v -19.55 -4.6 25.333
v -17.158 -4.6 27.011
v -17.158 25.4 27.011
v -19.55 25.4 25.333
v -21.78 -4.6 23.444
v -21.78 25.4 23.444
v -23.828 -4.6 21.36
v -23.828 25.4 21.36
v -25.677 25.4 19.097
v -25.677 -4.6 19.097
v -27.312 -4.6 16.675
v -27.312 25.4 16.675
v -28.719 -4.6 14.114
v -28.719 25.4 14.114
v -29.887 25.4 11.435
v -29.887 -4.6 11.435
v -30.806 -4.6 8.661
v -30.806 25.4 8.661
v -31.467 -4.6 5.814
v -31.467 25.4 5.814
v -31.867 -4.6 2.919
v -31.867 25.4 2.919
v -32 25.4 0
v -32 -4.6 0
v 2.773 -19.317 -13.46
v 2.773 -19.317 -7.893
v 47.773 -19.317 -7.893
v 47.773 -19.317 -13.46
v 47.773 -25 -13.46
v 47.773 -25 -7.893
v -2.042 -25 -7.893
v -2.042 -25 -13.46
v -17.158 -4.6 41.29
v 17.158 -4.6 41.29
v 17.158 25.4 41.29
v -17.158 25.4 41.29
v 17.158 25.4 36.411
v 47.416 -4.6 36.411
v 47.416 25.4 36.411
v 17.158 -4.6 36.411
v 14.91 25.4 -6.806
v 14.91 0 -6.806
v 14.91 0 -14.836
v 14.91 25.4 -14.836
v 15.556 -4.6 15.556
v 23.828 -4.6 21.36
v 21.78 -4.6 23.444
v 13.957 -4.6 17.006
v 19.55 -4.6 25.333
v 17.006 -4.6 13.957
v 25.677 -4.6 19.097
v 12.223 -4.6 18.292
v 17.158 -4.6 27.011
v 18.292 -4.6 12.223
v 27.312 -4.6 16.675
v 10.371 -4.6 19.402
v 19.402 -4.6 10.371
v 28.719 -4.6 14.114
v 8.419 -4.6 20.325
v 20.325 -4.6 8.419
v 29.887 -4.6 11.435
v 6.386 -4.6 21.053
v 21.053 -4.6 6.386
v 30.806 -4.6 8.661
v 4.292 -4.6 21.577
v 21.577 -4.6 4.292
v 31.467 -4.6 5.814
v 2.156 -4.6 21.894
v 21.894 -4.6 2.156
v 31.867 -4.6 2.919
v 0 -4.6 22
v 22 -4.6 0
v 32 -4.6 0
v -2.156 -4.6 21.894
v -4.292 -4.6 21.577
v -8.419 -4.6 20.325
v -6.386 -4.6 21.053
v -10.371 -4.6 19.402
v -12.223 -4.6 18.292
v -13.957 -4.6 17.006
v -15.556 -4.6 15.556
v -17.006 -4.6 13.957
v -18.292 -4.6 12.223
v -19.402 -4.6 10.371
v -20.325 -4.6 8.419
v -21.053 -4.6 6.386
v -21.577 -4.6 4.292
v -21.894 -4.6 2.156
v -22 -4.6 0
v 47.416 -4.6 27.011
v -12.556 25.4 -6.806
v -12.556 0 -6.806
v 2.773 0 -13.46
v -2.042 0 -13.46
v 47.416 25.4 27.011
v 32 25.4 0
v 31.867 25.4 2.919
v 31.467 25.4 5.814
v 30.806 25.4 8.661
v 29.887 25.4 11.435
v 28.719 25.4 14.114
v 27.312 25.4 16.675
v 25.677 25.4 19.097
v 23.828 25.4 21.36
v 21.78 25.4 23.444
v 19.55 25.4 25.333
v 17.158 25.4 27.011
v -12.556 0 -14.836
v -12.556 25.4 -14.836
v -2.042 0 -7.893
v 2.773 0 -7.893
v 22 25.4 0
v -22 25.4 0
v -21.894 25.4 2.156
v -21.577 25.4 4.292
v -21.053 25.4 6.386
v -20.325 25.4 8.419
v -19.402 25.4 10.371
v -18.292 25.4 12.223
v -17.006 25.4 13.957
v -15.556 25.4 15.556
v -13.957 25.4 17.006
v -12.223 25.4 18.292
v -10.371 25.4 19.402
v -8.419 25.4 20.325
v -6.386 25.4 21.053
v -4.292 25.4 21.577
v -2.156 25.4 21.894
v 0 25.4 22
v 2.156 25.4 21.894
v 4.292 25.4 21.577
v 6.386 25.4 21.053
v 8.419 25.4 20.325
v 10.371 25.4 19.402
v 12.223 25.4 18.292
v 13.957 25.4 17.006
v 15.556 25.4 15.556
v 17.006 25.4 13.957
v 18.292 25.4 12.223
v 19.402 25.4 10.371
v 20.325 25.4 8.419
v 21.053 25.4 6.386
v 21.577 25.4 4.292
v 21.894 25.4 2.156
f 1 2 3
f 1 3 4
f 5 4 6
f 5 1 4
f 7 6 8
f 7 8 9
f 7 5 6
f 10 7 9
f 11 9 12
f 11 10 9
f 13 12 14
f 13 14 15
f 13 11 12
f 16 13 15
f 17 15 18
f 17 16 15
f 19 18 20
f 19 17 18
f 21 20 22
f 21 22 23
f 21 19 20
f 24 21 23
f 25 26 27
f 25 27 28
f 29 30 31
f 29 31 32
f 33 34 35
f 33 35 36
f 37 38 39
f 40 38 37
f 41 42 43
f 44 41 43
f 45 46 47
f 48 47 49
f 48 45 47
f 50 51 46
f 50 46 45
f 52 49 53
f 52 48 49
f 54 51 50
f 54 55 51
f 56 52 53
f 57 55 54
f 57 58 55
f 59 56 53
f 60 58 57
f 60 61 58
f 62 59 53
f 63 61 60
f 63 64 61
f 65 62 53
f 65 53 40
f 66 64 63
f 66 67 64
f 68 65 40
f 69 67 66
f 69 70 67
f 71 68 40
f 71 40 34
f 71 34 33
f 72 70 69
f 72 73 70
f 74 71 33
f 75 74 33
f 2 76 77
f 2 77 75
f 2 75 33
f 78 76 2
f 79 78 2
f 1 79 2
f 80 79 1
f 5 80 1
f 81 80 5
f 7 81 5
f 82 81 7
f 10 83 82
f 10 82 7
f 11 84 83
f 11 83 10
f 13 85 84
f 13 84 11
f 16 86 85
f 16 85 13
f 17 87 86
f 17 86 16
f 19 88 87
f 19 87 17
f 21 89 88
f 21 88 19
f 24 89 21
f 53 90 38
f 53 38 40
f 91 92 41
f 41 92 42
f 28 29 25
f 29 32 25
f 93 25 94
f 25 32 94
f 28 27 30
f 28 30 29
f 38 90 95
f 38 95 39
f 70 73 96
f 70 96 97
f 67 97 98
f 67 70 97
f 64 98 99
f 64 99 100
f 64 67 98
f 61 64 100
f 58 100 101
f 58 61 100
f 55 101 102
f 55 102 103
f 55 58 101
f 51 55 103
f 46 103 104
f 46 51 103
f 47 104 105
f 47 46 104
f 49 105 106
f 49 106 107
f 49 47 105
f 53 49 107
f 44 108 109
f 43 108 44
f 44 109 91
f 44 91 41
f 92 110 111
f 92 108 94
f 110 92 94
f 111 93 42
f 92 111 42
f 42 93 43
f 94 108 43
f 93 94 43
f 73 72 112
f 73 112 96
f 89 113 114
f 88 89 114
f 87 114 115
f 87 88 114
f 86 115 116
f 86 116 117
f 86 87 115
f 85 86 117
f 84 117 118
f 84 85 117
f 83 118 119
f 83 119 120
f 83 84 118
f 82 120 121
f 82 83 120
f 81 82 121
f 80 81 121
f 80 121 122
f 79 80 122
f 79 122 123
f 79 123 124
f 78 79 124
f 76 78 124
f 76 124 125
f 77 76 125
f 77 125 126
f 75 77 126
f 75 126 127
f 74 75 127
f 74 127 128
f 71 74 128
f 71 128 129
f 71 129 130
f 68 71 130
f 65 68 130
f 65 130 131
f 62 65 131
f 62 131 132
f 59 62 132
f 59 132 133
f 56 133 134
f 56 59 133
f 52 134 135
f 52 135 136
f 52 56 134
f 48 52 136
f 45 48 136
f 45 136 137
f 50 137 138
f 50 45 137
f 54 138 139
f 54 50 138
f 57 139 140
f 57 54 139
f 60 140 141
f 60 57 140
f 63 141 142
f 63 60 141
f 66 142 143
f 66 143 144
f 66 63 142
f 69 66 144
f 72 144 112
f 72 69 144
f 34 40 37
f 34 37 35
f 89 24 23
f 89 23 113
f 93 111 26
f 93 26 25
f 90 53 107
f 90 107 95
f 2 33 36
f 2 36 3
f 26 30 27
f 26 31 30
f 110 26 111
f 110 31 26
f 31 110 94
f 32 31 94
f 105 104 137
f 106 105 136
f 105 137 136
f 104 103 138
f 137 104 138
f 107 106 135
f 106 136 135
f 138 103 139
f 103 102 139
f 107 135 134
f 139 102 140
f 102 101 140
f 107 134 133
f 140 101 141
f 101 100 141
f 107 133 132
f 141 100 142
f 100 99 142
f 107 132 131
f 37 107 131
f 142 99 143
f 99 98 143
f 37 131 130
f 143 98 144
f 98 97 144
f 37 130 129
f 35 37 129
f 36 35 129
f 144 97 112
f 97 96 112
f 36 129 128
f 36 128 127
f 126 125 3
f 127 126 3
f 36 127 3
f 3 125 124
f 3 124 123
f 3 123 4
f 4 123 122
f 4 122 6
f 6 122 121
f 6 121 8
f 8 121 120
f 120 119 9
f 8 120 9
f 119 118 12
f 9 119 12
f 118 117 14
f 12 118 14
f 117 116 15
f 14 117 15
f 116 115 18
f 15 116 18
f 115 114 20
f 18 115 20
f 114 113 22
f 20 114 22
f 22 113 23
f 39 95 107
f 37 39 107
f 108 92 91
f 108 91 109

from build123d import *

# Parameters (mm, degrees)
BOSS_EXTRUDE1_DEPTH   = 25.4
SKETCH3_W             = 27.465648235
SKETCH3_H             = 8.029689019
BOSS_EXTRUDE1_2_DEPTH = 25.4
BOSS_EXTRUDE3_START   = -30
BOSS_EXTRUDE3_DEPTH   = 30
SKETCH11_W            = 4.815186011
SKETCH11_H            = 5.567324058
BOSS_EXTRUDE7_DEPTH   = 25
SKETCH12_W            = 5.567324058
SKETCH12_H            = 5.682782698
BOSS_EXTRUDE10_DEPTH  = 45


with BuildPart() as part:
    # Sketch3 → Boss-Extrude1 (new body)
    with BuildSketch(Plane(origin=(0, 0, 0), x_dir=(1, 0, 0), z_dir=(0, 1, 0))):
        with BuildLine():
            Line((-32, 0), (-22, 0))
            ThreePointArc((-22, 0), (0, -22), (22, 0))
            Line((22, 0), (32, 0))
            ThreePointArc((32, 0), (28.045035802, -15.410255249), (17.157752073, -27.011322511))
            Line((17.157752073, -27.011322511), (17.157752073, -33.11424945))
            Line((17.157752073, -33.11424945), (4.438736665, -33.11424945))
            Line((4.438736665, -33.11424945), (-17.157752073, -33.11424945))
            Line((-17.157752073, -33.11424945), (-17.157752073, -27.011322511))
            ThreePointArc((-17.157752073, -27.011322511), (-28.045035802, -15.410255249), (-32, 0))
        make_face()
    extrude(amount=BOSS_EXTRUDE1_DEPTH)

    # Sketch6 → Boss-Extrude3 (add)
    with BuildSketch(Plane(origin=(0, 25.4, 0), x_dir=(1, 0, 0), z_dir=(0, 1, 0)).offset(BOSS_EXTRUDE3_START)):
        with BuildLine():
            Line((17.157752073, -27.011322511), (37.157752073, -27.011322511))
            Line((37.157752073, -27.011322511), (47.416343202, -27.011322511))
            Line((47.416343202, -27.011322511), (47.416343202, -33.11424945))
            Line((47.416343202, -33.11424945), (47.416343202, -36.4107034))
            Line((47.416343202, -36.4107034), (17.157752073, -36.4107034))
            Line((17.157752073, -36.4107034), (17.157752073, -41.289729226))
            Line((17.157752073, -41.289729226), (-17.157752073, -41.289729226))
            Line((-17.157752073, -41.289729226), (-17.157752073, -33.11424945))
            Line((-17.157752073, -33.11424945), (-17.157752073, -27.011322511))
            ThreePointArc((-17.157752073, -27.011322511), (-28.045035802, -15.410255249), (-32, 0))
            Line((-32, 0), (-22, 0))
            ThreePointArc((-22, 0), (0, -22), (22, 0))
            Line((22, 0), (32, 0))
            ThreePointArc((32, 0), (28.045035802, -15.410255249), (17.157752073, -27.011322511))
        make_face()
    extrude(amount=BOSS_EXTRUDE3_DEPTH)


with BuildPart() as body_2:
    # Sketch3 → Boss-Extrude1 2 (new body)
    with BuildSketch(Plane(origin=(0, 0, 0), x_dir=(1, 0, 0), z_dir=(0, 1, 0))):
        with Locations((1.17728503, 10.821309715)):
            Rectangle(SKETCH3_W, SKETCH3_H)
    extrude(amount=BOSS_EXTRUDE1_2_DEPTH)

    # Sketch11 → Boss-Extrude7 (add)
    with BuildSketch(Plane(origin=(0, 0, 0), x_dir=(-1, 0, 0), z_dir=(0, -1, 0))):
        with Locations((-0.365879556, 10.676539537)):
            Rectangle(SKETCH11_W, SKETCH11_H)
    extrude(amount=BOSS_EXTRUDE7_DEPTH)

    # Sketch12 → Boss-Extrude10 (add)
    with BuildSketch(Plane(origin=(2.773472561, 0, 0), x_dir=(0, 0, -1), z_dir=(1, 0, 0))):
        with Locations((10.676539537, -22.158608651)):
            Rectangle(SKETCH12_W, SKETCH12_H)
    extrude(amount=BOSS_EXTRUDE10_DEPTH)


solid = Compound([part.part, body_2.part])
